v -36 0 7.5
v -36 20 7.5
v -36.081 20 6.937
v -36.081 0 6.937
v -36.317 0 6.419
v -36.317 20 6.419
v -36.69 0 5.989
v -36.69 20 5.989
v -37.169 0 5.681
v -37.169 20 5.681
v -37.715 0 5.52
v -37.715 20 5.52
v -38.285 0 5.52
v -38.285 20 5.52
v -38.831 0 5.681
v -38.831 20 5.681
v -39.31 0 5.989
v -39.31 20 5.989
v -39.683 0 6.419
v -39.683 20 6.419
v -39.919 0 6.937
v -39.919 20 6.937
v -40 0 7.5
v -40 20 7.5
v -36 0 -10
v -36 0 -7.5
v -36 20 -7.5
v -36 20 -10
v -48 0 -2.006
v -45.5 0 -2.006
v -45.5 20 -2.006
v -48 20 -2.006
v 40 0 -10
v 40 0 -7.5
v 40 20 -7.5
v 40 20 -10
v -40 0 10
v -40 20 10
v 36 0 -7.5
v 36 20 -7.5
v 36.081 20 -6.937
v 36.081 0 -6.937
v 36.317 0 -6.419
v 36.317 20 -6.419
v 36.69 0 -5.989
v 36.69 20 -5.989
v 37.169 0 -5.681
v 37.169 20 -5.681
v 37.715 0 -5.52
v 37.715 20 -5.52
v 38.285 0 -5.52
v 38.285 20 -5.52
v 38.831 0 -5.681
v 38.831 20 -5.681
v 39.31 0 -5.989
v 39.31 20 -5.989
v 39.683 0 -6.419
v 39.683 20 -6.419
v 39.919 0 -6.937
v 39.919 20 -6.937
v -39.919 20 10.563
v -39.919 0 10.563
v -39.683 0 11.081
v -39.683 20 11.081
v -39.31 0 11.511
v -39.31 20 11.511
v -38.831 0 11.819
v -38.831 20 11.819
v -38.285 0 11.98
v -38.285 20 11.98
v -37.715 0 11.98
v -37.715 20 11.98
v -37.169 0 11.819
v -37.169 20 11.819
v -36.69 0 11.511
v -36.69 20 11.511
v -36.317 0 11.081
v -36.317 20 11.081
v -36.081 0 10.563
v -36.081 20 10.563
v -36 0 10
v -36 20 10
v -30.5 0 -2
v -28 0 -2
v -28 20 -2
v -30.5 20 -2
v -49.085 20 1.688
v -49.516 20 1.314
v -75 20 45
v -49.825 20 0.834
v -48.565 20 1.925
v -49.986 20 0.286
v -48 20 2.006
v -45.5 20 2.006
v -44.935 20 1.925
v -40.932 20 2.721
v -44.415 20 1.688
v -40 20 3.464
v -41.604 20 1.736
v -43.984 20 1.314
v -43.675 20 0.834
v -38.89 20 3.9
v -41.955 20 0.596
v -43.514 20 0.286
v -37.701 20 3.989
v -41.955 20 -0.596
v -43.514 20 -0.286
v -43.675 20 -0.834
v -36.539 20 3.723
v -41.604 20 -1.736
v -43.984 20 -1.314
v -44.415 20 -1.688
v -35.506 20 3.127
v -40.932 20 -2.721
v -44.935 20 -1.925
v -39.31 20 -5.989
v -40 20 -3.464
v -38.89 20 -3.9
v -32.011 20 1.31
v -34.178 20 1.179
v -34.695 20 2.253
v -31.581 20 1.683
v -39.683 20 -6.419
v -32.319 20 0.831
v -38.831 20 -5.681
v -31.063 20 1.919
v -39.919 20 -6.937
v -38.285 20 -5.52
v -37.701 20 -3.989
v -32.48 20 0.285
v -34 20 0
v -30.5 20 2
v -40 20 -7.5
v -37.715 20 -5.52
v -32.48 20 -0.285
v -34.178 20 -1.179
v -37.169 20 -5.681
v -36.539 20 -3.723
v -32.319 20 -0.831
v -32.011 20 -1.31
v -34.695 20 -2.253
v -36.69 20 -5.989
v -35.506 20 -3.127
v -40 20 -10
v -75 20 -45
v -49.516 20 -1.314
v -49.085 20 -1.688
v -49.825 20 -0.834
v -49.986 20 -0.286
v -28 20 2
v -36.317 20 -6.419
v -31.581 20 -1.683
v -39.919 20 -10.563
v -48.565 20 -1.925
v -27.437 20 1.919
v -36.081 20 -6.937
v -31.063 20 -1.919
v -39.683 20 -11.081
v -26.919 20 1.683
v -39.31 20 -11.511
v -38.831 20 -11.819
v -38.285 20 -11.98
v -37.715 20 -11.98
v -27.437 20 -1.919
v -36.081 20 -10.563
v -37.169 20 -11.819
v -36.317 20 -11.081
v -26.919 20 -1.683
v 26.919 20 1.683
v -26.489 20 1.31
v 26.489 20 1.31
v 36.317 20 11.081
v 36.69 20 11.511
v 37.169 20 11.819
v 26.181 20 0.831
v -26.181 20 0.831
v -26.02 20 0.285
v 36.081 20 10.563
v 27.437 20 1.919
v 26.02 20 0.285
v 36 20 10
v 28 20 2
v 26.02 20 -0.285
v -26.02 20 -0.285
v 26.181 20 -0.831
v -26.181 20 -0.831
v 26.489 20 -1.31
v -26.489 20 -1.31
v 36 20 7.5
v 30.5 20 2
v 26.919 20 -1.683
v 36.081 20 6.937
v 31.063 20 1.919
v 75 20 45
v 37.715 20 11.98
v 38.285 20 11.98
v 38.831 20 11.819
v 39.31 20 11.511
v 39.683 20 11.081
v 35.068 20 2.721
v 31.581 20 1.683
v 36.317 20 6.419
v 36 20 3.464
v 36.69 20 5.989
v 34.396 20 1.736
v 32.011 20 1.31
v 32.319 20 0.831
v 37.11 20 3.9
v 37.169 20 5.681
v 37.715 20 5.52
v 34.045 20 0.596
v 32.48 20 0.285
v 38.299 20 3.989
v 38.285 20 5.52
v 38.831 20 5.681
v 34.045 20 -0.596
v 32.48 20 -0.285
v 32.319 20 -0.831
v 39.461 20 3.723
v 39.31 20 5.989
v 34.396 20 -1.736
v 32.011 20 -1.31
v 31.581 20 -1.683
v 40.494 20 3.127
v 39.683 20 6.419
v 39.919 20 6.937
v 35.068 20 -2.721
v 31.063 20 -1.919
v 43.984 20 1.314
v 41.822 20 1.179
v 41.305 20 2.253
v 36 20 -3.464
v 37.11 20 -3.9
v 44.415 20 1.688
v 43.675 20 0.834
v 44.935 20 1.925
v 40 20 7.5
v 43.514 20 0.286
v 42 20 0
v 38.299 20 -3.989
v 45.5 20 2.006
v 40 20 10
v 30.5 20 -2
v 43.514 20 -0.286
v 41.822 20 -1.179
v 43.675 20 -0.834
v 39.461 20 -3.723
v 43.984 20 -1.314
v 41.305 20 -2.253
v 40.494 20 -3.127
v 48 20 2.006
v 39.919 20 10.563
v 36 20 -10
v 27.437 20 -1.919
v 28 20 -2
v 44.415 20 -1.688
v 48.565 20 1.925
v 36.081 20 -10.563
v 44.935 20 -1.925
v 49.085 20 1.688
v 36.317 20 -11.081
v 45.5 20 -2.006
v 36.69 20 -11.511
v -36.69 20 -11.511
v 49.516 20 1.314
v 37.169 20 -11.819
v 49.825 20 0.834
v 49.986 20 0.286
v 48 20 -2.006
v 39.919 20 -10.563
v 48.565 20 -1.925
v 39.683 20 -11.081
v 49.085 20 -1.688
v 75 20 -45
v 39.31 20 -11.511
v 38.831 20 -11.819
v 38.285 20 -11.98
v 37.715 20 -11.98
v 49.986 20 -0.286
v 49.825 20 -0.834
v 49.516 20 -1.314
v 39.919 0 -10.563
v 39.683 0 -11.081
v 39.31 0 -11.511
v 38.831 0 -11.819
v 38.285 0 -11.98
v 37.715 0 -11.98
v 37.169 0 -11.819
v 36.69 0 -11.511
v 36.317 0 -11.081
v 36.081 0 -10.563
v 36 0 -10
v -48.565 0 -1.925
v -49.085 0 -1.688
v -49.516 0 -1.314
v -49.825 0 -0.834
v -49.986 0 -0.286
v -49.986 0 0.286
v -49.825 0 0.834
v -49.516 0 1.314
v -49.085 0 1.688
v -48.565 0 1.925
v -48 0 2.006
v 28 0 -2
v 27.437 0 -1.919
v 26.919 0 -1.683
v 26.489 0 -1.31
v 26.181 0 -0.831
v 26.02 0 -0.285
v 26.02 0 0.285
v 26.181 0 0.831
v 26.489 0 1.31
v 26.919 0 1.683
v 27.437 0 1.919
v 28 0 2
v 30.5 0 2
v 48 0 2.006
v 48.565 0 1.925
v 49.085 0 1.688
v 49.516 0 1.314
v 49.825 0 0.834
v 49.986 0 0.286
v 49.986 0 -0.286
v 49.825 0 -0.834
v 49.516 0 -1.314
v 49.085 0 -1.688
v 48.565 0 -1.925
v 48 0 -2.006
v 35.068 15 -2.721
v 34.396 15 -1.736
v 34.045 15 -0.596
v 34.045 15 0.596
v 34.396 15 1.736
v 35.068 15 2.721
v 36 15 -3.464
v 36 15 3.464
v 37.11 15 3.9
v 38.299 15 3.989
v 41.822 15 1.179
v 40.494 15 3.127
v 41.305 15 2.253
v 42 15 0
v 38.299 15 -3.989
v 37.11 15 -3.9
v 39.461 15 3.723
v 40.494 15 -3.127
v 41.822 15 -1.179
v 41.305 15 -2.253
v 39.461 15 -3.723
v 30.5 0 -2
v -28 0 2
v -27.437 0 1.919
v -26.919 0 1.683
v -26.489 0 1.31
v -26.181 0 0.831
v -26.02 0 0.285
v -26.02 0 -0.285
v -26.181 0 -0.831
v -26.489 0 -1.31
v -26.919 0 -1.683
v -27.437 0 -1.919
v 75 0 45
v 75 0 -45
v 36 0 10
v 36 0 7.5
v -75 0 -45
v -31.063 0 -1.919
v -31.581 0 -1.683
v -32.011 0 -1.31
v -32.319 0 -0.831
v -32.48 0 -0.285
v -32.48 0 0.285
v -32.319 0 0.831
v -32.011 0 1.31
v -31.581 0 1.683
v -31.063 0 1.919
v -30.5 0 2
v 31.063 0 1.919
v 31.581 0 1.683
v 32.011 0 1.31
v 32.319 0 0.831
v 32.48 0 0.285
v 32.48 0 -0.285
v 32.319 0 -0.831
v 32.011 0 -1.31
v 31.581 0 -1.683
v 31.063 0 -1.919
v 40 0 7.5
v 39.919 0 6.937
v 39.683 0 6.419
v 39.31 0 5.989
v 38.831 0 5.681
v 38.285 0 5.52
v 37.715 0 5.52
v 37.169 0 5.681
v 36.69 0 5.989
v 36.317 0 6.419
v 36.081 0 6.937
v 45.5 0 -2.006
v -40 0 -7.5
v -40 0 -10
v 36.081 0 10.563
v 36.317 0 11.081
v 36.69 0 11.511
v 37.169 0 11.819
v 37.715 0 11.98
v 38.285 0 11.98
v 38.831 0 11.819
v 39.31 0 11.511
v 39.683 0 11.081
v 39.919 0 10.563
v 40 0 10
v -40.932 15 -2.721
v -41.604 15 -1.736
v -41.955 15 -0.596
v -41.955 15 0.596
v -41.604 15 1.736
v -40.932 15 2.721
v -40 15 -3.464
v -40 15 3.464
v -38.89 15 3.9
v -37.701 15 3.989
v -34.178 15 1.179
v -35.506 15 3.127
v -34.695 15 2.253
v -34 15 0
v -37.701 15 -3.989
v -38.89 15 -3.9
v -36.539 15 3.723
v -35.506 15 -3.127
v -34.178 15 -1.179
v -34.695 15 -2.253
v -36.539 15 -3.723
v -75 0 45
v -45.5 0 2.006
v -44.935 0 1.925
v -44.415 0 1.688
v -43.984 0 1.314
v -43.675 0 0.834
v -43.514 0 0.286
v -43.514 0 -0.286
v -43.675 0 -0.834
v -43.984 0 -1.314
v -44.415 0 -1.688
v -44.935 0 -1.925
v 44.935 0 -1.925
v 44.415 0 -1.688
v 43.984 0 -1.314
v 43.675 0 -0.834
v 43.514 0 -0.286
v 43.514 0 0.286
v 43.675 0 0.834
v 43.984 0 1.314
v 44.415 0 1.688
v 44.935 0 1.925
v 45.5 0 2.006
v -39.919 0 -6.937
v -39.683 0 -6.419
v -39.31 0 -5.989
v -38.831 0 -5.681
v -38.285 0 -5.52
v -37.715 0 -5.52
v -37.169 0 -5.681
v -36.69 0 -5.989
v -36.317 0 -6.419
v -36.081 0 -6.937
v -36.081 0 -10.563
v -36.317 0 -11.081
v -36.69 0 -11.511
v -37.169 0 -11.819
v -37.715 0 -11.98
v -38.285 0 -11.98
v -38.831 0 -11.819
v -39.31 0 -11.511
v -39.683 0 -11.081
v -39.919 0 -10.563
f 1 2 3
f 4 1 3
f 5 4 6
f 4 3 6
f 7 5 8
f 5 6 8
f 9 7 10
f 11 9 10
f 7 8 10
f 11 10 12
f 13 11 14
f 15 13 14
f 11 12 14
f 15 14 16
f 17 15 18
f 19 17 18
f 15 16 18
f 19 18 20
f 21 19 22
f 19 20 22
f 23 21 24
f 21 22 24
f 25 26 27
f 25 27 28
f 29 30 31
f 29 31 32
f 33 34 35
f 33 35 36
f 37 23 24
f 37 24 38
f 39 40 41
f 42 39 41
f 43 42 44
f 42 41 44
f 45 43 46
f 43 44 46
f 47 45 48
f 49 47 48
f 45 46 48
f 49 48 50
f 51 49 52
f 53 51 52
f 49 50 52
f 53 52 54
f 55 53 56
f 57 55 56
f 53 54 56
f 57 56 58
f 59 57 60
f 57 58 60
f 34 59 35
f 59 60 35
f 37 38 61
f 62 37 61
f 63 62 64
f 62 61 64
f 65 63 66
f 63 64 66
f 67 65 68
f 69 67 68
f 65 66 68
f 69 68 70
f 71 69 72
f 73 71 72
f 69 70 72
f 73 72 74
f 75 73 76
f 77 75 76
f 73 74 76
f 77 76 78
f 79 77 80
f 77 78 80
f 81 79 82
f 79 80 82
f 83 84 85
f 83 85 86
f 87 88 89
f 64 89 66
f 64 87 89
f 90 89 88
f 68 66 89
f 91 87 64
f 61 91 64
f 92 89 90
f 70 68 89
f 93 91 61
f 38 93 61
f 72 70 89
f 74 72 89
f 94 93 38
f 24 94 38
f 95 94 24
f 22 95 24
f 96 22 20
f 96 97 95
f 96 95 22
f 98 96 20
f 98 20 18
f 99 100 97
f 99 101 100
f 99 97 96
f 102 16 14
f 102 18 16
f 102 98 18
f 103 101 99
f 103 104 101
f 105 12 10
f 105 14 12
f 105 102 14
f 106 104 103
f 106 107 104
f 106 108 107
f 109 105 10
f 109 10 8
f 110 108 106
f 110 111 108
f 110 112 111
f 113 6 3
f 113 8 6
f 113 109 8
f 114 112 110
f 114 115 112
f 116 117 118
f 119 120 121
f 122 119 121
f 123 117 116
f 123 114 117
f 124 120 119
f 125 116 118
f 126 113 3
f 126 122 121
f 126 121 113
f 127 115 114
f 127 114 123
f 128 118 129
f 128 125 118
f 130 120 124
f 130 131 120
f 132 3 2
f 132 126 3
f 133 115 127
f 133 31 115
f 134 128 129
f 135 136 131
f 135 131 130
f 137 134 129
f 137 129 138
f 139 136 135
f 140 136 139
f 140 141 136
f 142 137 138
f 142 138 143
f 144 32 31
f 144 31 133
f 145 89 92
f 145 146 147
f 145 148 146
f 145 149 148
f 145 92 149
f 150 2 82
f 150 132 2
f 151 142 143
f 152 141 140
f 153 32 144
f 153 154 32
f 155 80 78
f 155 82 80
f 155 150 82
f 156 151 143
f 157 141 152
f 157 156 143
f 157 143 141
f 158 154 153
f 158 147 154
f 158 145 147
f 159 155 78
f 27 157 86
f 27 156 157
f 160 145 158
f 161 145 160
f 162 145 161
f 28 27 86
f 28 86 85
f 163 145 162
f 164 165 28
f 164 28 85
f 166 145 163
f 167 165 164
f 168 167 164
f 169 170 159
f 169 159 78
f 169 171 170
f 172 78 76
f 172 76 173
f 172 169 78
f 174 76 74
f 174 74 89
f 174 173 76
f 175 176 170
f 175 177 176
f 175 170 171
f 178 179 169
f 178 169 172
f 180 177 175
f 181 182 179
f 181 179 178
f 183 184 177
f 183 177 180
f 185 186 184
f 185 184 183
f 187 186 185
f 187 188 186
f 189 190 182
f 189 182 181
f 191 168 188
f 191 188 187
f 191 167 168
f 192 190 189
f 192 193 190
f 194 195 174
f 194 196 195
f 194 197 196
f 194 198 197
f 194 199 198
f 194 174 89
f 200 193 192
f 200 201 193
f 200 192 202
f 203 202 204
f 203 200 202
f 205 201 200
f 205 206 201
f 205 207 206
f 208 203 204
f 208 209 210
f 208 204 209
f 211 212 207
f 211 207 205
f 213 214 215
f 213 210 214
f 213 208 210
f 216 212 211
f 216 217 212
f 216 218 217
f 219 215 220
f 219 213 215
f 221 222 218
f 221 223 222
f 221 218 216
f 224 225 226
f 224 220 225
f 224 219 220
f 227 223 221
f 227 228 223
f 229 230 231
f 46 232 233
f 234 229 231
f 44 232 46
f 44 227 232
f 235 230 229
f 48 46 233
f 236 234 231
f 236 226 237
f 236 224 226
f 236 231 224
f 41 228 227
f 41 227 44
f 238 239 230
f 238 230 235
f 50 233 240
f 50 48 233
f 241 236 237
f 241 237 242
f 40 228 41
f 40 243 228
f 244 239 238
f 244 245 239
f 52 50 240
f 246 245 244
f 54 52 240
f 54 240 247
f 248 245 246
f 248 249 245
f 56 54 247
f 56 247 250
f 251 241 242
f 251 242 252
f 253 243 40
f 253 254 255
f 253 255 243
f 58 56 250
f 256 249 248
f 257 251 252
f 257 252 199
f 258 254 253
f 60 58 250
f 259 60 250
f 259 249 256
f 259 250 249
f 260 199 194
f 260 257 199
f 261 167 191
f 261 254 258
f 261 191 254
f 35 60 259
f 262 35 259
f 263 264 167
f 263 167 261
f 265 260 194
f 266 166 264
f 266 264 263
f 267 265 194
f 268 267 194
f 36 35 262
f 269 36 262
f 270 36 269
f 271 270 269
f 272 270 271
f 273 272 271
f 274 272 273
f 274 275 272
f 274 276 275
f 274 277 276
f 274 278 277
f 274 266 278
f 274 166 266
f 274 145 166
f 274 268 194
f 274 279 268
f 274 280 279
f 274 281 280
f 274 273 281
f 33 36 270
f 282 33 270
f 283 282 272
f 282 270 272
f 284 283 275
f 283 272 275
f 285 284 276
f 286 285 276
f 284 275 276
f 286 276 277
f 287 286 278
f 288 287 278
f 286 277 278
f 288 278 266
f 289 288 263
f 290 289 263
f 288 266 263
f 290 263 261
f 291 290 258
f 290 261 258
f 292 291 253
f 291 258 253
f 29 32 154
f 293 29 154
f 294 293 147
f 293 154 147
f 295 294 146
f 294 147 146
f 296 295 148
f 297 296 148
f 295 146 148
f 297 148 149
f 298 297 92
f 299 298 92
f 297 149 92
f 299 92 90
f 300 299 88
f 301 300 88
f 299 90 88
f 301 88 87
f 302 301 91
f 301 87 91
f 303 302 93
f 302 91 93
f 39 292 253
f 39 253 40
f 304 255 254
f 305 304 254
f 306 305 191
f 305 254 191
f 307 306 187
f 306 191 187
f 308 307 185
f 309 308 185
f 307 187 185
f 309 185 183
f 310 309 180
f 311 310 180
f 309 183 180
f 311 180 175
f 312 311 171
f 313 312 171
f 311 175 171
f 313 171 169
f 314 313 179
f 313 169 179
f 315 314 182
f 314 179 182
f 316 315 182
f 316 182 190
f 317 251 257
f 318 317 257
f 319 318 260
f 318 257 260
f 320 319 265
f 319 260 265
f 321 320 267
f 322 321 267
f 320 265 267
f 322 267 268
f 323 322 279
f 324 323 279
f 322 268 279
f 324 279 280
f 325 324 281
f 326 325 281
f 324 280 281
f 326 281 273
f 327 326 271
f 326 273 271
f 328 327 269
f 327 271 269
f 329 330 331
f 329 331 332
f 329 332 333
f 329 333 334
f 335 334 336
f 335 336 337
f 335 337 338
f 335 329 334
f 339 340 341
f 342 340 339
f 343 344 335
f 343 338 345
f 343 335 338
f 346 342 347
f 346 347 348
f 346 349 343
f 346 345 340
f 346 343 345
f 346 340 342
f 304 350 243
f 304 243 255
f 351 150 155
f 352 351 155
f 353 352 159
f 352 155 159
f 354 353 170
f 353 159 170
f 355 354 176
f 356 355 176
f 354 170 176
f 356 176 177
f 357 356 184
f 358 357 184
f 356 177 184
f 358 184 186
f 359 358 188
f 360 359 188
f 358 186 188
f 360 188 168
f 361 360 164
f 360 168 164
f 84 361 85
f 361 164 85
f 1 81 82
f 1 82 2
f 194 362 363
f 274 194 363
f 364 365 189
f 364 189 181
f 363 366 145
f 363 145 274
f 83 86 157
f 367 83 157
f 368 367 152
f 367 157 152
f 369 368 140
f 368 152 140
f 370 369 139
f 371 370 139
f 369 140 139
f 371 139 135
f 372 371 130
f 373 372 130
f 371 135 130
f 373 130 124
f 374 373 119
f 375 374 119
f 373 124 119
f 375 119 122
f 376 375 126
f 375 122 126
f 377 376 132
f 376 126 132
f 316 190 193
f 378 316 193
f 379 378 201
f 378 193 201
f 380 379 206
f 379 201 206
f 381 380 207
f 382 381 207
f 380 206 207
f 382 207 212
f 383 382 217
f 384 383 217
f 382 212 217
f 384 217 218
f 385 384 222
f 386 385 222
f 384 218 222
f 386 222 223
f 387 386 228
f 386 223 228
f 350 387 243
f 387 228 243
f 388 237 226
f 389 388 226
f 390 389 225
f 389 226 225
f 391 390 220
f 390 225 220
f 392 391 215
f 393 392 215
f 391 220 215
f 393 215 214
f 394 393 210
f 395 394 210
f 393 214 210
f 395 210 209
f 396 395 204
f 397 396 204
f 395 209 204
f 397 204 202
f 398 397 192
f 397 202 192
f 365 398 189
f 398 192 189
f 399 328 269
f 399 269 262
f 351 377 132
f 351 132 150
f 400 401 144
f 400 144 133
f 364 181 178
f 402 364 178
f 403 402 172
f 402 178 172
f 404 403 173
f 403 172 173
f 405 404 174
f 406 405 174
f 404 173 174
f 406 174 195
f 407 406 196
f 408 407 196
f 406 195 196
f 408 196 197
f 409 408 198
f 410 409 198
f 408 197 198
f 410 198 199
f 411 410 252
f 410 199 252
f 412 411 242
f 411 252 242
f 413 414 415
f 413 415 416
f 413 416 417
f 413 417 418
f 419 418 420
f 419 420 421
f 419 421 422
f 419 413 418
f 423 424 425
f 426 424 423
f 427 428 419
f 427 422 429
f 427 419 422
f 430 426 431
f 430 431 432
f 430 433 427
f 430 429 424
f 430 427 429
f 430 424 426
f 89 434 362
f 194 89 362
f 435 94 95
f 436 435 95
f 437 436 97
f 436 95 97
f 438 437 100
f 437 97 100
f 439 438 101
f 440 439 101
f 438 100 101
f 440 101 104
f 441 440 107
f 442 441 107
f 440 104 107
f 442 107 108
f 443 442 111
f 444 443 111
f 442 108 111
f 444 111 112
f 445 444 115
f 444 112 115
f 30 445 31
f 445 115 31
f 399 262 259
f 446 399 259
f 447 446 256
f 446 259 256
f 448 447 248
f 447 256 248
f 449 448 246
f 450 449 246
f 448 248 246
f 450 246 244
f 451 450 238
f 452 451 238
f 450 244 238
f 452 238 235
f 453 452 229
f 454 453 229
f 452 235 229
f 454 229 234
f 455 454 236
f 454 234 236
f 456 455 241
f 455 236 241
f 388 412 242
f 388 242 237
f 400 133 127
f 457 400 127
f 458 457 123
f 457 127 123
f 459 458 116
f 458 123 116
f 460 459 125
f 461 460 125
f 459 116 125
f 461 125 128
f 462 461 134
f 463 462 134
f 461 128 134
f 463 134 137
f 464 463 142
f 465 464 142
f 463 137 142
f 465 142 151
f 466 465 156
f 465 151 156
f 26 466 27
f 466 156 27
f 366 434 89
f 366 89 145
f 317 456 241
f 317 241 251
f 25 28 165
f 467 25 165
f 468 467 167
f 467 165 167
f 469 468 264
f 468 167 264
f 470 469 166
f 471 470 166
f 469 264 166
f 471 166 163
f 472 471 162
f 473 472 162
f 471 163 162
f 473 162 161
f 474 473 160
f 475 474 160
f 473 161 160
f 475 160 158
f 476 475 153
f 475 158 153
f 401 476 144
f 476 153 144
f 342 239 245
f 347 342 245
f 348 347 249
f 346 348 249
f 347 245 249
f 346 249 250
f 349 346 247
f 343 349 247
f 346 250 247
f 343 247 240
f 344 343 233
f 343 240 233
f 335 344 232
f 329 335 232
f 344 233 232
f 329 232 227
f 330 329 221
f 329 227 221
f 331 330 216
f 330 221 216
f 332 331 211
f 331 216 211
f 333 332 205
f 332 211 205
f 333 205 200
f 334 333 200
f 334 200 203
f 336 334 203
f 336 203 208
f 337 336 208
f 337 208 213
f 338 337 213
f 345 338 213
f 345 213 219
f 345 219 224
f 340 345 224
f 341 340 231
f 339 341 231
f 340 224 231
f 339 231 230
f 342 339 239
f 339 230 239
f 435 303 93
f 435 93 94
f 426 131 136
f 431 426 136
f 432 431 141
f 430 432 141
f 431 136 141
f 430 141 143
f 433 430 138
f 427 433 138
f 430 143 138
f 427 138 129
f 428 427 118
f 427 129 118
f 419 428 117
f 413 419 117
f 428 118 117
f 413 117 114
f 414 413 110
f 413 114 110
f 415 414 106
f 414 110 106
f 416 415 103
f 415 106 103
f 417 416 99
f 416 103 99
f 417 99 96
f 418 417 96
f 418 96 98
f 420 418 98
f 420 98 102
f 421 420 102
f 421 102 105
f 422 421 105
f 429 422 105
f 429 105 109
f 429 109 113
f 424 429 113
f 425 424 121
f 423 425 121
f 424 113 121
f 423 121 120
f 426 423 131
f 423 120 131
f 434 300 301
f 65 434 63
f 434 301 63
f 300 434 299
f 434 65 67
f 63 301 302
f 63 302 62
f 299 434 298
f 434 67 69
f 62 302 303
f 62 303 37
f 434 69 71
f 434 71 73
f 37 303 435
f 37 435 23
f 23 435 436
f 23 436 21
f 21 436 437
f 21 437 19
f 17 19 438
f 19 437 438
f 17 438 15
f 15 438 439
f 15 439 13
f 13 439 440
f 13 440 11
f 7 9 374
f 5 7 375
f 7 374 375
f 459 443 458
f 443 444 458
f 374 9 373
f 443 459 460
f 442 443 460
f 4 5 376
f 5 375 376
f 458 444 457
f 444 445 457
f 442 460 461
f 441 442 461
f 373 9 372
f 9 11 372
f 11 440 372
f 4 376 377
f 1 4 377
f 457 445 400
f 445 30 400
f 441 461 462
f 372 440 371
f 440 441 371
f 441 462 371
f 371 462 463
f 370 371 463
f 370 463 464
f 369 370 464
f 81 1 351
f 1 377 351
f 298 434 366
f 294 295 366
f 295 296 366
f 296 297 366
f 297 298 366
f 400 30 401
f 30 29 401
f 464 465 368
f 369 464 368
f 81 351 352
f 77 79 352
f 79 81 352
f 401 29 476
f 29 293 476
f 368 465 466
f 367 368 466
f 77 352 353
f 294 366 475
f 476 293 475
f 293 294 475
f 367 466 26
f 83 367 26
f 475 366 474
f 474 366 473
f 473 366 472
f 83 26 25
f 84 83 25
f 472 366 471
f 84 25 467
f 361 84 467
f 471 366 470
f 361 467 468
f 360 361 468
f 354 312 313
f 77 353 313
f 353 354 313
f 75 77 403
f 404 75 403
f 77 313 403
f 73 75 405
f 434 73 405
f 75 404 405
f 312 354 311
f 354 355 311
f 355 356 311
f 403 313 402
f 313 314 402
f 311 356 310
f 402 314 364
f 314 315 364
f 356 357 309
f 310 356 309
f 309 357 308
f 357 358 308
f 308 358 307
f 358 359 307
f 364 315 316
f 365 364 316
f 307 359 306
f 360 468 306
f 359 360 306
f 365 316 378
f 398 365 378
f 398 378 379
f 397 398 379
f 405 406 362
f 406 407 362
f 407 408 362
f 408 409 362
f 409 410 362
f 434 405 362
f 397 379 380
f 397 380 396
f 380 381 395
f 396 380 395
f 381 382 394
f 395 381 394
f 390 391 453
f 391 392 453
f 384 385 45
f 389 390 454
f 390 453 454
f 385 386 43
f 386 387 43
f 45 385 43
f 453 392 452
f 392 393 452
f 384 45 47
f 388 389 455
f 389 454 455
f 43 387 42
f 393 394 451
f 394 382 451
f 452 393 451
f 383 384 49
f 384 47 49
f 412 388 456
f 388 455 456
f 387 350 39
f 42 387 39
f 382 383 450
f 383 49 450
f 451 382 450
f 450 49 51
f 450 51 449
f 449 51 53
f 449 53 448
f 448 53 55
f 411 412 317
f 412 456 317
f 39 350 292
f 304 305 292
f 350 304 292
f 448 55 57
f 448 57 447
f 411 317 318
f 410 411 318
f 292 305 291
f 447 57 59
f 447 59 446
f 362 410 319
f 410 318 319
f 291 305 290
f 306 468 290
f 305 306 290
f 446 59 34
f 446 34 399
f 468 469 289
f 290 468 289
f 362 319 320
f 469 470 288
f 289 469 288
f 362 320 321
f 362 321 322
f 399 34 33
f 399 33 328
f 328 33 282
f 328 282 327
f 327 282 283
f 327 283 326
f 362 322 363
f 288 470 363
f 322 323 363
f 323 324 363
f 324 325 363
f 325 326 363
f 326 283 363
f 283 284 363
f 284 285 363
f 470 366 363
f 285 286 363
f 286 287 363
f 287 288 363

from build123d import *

# Parameters (mm, degrees)
SKETCH2_W           = 150
SKETCH2_H           = 90
BOSS_EXTRUDE1_DEPTH = 20
SKETCH3_R           = 4
CUT_EXTRUDE1_DEPTH  = 5
CUT_EXTRUDE2_DEPTH  = 21


with BuildPart() as part:
    # Sketch2 → Boss-Extrude1 (new body)
    with BuildSketch(Plane(origin=(0, 0, 0), x_dir=(1, 0, 0), z_dir=(0, 1, 0))):
        Rectangle(SKETCH2_W, SKETCH2_H)
    extrude(amount=BOSS_EXTRUDE1_DEPTH)

    # Sketch3 → Cut-Extrude1 (cut)
    with BuildSketch(Plane(origin=(0, 20, 0), x_dir=(1, 0, 0), z_dir=(0, 1, 0))):
        with Locations((-38, 0)):
            Circle(SKETCH3_R)
        with Locations((38, 0)):
            Circle(SKETCH3_R)
    extrude(amount=-CUT_EXTRUDE1_DEPTH, mode=Mode.SUBTRACT)

    # Sketch4 → Cut-Extrude2 (cut, through all)
    with BuildSketch(Plane(origin=(0, 20, 0), x_dir=(1, 0, 0), z_dir=(0, 1, 0))):
        with BuildLine():
            Line((-45.5, 2.006446443), (-48, 2.006446443))
            ThreePointArc((-48, 2.006446443), (-50.006446443, 0), (-48, -2.006446443))
            Line((-48, -2.006446443), (-45.5, -2.006446443))
            ThreePointArc((-45.5, -2.006446443), (-43.493553557, 0), (-45.5, 2.006446443))
        make_face()
        with BuildLine():
            Line((-36, 7.5), (-36, 10))
            ThreePointArc((-36, 10), (-38, 12), (-40, 10))
            Line((-40, 10), (-40, 7.5))
            ThreePointArc((-40, 7.5), (-38, 5.5), (-36, 7.5))
        make_face()
        with BuildLine():
            Line((-28, 2), (-30.5, 2))
            ThreePointArc((-30.5, 2), (-32.5, 0), (-30.5, -2))
            Line((-30.5, -2), (-28, -2))
            ThreePointArc((-28, -2), (-26, 0), (-28, 2))
        make_face()
        with BuildLine():
            Line((-40, -7.5), (-40, -10))
            ThreePointArc((-40, -10), (-38, -12), (-36, -10))
            Line((-36, -10), (-36, -7.5))
            ThreePointArc((-36, -7.5), (-38, -5.5), (-40, -7.5))
        make_face()
        with BuildLine():
            ThreePointArc((48, -2.006446443), (50.006446443, 0), (48, 2.006446443))
            Line((48, 2.006446443), (45.5, 2.006446443))
            ThreePointArc((45.5, 2.006446443), (43.493553557, 0), (45.5, -2.006446443))
            Line((45.5, -2.006446443), (48, -2.006446443))
        make_face()
        with BuildLine():
            ThreePointArc((40, 10), (38, 12), (36, 10))
            Line((36, 10), (36, 7.5))
            ThreePointArc((36, 7.5), (38, 5.5), (40, 7.5))
            Line((40, 7.5), (40, 10))
        make_face()
        with BuildLine():
            ThreePointArc((30.5, -2), (32.5, 0), (30.5, 2))
            Line((30.5, 2), (28, 2))
            ThreePointArc((28, 2), (26, 0), (28, -2))
            Line((28, -2), (30.5, -2))
        make_face()
        with BuildLine():
            ThreePointArc((36, -10), (38, -12), (40, -10))
            Line((40, -10), (40, -7.5))
            ThreePointArc((40, -7.5), (38, -5.5), (36, -7.5))
            Line((36, -7.5), (36, -10))
        make_face()
    extrude(amount=-CUT_EXTRUDE2_DEPTH, mode=Mode.SUBTRACT)


solid = part.part
